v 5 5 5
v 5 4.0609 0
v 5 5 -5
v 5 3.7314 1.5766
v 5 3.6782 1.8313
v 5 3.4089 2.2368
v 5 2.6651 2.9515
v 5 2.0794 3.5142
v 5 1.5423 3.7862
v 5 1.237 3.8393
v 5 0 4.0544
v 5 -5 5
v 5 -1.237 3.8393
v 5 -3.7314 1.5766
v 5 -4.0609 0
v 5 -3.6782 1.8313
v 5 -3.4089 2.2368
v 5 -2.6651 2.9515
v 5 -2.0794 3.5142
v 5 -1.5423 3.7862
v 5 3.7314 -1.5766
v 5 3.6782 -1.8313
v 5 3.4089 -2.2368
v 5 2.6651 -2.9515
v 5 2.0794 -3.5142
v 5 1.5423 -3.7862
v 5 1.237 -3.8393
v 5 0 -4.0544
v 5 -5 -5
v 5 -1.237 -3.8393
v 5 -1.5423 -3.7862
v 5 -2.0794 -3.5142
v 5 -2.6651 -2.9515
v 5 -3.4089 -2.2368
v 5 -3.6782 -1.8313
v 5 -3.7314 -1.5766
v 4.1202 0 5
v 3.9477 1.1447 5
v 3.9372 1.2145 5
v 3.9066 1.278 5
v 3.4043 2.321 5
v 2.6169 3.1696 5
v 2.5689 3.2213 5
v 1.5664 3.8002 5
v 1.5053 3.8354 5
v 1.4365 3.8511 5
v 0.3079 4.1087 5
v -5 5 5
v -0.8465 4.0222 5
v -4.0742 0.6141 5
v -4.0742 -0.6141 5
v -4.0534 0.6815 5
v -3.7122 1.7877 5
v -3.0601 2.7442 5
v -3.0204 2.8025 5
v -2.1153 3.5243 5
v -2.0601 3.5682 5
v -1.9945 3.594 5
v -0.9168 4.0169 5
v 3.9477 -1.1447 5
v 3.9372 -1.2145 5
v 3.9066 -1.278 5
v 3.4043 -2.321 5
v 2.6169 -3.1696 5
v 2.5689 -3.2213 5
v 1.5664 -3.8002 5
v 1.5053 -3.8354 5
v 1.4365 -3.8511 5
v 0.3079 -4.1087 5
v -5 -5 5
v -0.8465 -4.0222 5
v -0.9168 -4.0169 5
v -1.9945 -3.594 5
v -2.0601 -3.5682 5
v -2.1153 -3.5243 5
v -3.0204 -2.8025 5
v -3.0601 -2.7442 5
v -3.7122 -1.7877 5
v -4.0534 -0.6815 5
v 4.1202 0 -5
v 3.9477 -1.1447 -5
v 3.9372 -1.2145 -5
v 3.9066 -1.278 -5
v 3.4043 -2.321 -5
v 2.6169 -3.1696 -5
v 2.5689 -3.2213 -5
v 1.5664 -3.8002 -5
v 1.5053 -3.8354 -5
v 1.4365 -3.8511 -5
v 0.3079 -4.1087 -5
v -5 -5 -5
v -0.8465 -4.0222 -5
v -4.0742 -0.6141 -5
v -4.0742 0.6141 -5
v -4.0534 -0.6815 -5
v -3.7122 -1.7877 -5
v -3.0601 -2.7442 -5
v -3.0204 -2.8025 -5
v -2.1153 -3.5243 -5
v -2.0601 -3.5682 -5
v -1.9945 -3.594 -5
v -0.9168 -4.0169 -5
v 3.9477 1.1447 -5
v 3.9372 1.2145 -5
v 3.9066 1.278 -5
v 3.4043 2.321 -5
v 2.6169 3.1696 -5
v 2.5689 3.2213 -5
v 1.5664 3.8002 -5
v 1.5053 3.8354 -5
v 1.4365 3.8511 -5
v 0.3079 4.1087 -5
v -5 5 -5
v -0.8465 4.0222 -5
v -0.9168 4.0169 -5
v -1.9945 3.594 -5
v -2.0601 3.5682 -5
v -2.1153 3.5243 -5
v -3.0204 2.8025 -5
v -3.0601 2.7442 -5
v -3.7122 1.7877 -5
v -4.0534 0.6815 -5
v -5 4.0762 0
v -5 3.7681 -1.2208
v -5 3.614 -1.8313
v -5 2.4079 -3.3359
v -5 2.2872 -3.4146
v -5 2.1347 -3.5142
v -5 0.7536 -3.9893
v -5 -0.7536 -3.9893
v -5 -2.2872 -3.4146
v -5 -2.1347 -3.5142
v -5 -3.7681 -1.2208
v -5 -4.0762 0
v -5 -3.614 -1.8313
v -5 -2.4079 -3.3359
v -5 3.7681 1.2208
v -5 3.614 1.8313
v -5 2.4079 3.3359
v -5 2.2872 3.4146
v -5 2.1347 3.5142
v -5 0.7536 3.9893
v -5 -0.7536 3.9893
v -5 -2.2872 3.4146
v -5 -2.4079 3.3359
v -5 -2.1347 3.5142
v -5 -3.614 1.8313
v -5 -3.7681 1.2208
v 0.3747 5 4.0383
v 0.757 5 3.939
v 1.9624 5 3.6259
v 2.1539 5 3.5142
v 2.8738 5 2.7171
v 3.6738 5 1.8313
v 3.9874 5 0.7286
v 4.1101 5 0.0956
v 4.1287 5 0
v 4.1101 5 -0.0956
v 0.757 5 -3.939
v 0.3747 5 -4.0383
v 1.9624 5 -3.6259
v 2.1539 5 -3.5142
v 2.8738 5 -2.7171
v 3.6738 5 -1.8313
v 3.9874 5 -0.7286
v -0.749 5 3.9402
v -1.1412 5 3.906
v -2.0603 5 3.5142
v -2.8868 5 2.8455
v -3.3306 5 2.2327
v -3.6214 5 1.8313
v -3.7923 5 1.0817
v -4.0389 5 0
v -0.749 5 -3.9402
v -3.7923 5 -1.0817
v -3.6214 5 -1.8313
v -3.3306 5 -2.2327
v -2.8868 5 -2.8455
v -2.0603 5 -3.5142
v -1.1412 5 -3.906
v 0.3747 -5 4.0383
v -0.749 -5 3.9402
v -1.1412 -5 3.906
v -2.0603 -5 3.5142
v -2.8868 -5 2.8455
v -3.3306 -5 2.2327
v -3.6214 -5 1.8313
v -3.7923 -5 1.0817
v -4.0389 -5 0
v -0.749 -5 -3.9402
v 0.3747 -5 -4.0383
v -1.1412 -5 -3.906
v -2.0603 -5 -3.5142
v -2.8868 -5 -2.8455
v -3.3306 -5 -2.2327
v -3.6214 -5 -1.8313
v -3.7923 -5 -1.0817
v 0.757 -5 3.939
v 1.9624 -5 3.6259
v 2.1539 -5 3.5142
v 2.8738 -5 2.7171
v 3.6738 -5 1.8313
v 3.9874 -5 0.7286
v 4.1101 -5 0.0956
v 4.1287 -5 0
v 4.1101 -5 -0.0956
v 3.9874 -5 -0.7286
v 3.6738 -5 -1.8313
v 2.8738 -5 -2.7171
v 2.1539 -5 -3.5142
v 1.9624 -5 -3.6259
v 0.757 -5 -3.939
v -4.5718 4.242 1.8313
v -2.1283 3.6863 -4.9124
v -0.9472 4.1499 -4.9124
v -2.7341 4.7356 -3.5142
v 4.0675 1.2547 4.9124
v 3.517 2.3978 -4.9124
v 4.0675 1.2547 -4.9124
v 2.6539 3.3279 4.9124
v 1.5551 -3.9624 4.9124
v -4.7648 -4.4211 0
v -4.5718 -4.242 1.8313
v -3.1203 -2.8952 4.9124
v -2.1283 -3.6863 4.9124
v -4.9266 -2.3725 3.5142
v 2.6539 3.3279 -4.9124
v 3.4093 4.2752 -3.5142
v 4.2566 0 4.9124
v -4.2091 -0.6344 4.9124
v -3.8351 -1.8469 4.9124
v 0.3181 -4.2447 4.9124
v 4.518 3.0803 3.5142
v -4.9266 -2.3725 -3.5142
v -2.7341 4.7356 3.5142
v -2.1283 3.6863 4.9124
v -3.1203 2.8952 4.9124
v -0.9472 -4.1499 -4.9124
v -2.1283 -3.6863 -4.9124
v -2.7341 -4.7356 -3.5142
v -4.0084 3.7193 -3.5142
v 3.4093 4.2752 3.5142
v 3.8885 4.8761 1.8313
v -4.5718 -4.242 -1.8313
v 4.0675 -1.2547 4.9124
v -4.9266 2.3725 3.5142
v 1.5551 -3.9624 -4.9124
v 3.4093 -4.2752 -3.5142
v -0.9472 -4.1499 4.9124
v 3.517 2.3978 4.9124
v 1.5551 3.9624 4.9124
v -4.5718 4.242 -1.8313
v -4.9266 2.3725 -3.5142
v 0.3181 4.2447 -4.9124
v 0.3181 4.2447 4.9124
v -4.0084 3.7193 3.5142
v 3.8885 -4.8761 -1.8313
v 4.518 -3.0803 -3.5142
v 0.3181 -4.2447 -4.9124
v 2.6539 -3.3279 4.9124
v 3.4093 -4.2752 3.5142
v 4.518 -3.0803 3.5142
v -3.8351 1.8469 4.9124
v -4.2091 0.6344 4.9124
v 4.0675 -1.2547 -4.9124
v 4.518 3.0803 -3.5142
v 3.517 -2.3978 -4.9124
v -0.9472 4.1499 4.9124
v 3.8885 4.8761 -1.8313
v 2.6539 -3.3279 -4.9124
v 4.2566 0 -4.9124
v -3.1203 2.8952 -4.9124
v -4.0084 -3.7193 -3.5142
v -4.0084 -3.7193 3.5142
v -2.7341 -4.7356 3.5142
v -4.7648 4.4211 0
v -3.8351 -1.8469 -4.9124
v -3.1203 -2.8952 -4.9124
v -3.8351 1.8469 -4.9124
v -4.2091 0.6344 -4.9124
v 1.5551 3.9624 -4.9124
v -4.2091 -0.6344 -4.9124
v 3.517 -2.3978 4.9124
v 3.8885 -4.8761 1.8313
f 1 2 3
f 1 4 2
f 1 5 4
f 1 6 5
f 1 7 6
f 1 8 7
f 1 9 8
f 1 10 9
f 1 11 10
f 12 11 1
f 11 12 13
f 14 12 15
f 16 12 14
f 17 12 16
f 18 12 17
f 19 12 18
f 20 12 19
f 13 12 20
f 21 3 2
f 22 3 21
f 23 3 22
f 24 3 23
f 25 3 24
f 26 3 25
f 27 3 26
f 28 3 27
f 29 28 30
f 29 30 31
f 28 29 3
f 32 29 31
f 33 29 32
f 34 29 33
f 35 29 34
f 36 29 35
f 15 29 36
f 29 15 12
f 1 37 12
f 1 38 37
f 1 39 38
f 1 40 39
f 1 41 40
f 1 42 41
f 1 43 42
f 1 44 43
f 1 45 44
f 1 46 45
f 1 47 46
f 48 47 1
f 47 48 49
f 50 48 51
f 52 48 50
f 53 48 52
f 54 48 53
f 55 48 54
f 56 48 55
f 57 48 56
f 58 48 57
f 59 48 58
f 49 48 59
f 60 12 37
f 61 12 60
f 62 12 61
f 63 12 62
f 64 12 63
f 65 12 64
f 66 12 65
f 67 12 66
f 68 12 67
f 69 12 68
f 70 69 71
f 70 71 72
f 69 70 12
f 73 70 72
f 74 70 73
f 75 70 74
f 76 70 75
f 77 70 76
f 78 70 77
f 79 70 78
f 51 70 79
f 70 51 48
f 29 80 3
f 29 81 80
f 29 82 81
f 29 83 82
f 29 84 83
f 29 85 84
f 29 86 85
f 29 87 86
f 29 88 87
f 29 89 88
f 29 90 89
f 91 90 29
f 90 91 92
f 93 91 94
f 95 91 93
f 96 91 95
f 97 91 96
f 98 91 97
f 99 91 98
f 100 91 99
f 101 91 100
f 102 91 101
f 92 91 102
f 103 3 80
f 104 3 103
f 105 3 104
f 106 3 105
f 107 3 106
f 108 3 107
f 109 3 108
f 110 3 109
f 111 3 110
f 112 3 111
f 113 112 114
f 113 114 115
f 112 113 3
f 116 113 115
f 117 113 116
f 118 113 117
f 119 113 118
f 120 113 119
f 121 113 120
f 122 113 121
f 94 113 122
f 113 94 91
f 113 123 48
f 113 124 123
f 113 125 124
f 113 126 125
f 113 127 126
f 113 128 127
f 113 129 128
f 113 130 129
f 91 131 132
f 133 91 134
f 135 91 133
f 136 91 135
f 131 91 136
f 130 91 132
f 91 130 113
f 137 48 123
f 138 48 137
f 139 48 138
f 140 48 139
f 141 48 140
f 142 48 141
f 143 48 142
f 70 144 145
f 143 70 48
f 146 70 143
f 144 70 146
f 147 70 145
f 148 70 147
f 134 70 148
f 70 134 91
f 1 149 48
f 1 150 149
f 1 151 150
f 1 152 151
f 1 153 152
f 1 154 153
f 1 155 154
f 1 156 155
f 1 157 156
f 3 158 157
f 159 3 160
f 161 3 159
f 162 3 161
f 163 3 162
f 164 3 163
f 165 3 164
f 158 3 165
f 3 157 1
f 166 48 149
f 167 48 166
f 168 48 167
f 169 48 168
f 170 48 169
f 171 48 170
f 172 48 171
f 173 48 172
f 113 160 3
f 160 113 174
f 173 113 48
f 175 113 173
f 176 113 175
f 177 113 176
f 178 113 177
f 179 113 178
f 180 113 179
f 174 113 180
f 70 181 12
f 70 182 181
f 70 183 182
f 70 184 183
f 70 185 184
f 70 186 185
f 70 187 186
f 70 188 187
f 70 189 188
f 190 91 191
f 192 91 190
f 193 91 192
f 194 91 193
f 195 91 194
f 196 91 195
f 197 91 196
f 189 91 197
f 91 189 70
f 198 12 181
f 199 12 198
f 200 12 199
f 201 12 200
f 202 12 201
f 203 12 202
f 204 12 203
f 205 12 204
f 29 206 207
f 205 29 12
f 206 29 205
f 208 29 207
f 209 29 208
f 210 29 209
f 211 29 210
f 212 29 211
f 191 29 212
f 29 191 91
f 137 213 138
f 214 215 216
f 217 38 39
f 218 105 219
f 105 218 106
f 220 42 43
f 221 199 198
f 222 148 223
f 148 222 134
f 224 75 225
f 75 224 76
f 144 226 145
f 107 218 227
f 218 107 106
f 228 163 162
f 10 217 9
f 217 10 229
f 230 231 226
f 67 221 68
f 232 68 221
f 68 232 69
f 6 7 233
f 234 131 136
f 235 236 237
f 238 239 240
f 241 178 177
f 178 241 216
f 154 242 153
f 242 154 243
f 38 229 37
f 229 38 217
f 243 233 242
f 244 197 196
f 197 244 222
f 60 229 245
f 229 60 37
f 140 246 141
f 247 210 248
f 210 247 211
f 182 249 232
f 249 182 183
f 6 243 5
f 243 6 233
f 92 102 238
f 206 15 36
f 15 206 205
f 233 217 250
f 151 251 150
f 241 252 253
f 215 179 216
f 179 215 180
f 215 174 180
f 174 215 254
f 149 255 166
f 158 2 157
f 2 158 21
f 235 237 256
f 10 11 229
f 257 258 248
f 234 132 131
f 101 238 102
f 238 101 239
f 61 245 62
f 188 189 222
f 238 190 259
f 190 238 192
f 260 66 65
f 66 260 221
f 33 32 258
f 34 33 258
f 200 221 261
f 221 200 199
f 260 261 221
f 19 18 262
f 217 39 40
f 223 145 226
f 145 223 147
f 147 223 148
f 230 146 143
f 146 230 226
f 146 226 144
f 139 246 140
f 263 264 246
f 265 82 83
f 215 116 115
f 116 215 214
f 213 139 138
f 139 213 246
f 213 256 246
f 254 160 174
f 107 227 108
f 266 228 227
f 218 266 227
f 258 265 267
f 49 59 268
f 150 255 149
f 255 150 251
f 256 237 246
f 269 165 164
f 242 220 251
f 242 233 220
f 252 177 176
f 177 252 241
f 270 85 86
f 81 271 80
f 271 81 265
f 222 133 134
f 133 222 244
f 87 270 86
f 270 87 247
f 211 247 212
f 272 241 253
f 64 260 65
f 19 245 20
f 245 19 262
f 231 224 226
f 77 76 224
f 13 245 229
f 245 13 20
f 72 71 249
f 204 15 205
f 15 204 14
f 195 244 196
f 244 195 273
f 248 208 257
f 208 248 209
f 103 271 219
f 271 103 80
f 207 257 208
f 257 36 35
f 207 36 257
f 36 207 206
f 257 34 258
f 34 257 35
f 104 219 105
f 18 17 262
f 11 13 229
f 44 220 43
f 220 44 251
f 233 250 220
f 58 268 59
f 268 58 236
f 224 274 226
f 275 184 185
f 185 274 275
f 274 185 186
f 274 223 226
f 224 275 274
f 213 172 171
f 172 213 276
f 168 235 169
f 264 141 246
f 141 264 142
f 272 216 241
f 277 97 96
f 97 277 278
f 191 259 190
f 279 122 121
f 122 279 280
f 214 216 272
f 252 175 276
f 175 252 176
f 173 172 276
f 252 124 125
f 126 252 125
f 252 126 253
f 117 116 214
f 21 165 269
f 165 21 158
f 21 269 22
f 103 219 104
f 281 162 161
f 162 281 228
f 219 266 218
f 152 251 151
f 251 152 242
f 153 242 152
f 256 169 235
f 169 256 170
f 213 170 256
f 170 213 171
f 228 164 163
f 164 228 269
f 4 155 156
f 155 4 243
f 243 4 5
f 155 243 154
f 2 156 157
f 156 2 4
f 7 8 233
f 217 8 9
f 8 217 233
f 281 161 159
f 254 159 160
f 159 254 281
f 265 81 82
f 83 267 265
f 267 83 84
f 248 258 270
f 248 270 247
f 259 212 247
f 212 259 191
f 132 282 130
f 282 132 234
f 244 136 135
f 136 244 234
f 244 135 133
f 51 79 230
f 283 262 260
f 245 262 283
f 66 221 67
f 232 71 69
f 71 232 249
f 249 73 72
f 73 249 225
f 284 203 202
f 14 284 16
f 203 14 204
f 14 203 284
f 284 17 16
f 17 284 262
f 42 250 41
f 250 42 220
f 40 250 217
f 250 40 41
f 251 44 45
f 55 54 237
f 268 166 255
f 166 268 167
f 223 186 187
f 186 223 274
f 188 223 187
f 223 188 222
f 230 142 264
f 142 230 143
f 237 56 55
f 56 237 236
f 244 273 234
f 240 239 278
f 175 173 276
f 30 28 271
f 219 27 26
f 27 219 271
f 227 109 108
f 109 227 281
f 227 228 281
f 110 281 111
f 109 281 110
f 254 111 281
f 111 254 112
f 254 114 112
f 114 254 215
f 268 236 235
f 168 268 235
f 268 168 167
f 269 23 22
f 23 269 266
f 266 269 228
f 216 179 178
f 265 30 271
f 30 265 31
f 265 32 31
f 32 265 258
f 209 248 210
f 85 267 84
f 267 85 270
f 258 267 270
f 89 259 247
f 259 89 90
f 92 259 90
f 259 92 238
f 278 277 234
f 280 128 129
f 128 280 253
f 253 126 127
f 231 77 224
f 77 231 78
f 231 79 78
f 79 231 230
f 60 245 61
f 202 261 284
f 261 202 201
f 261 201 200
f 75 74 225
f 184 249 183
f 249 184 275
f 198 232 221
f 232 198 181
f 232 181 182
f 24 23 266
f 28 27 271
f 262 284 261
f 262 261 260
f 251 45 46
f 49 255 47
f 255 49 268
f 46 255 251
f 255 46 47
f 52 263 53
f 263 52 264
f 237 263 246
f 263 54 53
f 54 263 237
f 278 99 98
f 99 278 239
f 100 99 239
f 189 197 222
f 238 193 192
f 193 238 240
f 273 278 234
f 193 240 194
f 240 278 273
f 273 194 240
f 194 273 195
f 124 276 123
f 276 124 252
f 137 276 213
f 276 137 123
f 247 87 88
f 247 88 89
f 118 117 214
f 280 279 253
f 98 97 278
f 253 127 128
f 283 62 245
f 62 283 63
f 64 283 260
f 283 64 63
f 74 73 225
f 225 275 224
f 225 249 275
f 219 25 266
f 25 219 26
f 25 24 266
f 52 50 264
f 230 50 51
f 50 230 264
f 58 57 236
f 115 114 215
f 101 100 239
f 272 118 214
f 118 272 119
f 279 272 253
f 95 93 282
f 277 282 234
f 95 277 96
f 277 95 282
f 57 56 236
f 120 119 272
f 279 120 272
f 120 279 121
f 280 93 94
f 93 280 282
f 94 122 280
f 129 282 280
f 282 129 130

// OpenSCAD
// A model the element fetches (src="model.scad").
difference() {
  cube(10, center = true);
  sphere(6.5);
}
